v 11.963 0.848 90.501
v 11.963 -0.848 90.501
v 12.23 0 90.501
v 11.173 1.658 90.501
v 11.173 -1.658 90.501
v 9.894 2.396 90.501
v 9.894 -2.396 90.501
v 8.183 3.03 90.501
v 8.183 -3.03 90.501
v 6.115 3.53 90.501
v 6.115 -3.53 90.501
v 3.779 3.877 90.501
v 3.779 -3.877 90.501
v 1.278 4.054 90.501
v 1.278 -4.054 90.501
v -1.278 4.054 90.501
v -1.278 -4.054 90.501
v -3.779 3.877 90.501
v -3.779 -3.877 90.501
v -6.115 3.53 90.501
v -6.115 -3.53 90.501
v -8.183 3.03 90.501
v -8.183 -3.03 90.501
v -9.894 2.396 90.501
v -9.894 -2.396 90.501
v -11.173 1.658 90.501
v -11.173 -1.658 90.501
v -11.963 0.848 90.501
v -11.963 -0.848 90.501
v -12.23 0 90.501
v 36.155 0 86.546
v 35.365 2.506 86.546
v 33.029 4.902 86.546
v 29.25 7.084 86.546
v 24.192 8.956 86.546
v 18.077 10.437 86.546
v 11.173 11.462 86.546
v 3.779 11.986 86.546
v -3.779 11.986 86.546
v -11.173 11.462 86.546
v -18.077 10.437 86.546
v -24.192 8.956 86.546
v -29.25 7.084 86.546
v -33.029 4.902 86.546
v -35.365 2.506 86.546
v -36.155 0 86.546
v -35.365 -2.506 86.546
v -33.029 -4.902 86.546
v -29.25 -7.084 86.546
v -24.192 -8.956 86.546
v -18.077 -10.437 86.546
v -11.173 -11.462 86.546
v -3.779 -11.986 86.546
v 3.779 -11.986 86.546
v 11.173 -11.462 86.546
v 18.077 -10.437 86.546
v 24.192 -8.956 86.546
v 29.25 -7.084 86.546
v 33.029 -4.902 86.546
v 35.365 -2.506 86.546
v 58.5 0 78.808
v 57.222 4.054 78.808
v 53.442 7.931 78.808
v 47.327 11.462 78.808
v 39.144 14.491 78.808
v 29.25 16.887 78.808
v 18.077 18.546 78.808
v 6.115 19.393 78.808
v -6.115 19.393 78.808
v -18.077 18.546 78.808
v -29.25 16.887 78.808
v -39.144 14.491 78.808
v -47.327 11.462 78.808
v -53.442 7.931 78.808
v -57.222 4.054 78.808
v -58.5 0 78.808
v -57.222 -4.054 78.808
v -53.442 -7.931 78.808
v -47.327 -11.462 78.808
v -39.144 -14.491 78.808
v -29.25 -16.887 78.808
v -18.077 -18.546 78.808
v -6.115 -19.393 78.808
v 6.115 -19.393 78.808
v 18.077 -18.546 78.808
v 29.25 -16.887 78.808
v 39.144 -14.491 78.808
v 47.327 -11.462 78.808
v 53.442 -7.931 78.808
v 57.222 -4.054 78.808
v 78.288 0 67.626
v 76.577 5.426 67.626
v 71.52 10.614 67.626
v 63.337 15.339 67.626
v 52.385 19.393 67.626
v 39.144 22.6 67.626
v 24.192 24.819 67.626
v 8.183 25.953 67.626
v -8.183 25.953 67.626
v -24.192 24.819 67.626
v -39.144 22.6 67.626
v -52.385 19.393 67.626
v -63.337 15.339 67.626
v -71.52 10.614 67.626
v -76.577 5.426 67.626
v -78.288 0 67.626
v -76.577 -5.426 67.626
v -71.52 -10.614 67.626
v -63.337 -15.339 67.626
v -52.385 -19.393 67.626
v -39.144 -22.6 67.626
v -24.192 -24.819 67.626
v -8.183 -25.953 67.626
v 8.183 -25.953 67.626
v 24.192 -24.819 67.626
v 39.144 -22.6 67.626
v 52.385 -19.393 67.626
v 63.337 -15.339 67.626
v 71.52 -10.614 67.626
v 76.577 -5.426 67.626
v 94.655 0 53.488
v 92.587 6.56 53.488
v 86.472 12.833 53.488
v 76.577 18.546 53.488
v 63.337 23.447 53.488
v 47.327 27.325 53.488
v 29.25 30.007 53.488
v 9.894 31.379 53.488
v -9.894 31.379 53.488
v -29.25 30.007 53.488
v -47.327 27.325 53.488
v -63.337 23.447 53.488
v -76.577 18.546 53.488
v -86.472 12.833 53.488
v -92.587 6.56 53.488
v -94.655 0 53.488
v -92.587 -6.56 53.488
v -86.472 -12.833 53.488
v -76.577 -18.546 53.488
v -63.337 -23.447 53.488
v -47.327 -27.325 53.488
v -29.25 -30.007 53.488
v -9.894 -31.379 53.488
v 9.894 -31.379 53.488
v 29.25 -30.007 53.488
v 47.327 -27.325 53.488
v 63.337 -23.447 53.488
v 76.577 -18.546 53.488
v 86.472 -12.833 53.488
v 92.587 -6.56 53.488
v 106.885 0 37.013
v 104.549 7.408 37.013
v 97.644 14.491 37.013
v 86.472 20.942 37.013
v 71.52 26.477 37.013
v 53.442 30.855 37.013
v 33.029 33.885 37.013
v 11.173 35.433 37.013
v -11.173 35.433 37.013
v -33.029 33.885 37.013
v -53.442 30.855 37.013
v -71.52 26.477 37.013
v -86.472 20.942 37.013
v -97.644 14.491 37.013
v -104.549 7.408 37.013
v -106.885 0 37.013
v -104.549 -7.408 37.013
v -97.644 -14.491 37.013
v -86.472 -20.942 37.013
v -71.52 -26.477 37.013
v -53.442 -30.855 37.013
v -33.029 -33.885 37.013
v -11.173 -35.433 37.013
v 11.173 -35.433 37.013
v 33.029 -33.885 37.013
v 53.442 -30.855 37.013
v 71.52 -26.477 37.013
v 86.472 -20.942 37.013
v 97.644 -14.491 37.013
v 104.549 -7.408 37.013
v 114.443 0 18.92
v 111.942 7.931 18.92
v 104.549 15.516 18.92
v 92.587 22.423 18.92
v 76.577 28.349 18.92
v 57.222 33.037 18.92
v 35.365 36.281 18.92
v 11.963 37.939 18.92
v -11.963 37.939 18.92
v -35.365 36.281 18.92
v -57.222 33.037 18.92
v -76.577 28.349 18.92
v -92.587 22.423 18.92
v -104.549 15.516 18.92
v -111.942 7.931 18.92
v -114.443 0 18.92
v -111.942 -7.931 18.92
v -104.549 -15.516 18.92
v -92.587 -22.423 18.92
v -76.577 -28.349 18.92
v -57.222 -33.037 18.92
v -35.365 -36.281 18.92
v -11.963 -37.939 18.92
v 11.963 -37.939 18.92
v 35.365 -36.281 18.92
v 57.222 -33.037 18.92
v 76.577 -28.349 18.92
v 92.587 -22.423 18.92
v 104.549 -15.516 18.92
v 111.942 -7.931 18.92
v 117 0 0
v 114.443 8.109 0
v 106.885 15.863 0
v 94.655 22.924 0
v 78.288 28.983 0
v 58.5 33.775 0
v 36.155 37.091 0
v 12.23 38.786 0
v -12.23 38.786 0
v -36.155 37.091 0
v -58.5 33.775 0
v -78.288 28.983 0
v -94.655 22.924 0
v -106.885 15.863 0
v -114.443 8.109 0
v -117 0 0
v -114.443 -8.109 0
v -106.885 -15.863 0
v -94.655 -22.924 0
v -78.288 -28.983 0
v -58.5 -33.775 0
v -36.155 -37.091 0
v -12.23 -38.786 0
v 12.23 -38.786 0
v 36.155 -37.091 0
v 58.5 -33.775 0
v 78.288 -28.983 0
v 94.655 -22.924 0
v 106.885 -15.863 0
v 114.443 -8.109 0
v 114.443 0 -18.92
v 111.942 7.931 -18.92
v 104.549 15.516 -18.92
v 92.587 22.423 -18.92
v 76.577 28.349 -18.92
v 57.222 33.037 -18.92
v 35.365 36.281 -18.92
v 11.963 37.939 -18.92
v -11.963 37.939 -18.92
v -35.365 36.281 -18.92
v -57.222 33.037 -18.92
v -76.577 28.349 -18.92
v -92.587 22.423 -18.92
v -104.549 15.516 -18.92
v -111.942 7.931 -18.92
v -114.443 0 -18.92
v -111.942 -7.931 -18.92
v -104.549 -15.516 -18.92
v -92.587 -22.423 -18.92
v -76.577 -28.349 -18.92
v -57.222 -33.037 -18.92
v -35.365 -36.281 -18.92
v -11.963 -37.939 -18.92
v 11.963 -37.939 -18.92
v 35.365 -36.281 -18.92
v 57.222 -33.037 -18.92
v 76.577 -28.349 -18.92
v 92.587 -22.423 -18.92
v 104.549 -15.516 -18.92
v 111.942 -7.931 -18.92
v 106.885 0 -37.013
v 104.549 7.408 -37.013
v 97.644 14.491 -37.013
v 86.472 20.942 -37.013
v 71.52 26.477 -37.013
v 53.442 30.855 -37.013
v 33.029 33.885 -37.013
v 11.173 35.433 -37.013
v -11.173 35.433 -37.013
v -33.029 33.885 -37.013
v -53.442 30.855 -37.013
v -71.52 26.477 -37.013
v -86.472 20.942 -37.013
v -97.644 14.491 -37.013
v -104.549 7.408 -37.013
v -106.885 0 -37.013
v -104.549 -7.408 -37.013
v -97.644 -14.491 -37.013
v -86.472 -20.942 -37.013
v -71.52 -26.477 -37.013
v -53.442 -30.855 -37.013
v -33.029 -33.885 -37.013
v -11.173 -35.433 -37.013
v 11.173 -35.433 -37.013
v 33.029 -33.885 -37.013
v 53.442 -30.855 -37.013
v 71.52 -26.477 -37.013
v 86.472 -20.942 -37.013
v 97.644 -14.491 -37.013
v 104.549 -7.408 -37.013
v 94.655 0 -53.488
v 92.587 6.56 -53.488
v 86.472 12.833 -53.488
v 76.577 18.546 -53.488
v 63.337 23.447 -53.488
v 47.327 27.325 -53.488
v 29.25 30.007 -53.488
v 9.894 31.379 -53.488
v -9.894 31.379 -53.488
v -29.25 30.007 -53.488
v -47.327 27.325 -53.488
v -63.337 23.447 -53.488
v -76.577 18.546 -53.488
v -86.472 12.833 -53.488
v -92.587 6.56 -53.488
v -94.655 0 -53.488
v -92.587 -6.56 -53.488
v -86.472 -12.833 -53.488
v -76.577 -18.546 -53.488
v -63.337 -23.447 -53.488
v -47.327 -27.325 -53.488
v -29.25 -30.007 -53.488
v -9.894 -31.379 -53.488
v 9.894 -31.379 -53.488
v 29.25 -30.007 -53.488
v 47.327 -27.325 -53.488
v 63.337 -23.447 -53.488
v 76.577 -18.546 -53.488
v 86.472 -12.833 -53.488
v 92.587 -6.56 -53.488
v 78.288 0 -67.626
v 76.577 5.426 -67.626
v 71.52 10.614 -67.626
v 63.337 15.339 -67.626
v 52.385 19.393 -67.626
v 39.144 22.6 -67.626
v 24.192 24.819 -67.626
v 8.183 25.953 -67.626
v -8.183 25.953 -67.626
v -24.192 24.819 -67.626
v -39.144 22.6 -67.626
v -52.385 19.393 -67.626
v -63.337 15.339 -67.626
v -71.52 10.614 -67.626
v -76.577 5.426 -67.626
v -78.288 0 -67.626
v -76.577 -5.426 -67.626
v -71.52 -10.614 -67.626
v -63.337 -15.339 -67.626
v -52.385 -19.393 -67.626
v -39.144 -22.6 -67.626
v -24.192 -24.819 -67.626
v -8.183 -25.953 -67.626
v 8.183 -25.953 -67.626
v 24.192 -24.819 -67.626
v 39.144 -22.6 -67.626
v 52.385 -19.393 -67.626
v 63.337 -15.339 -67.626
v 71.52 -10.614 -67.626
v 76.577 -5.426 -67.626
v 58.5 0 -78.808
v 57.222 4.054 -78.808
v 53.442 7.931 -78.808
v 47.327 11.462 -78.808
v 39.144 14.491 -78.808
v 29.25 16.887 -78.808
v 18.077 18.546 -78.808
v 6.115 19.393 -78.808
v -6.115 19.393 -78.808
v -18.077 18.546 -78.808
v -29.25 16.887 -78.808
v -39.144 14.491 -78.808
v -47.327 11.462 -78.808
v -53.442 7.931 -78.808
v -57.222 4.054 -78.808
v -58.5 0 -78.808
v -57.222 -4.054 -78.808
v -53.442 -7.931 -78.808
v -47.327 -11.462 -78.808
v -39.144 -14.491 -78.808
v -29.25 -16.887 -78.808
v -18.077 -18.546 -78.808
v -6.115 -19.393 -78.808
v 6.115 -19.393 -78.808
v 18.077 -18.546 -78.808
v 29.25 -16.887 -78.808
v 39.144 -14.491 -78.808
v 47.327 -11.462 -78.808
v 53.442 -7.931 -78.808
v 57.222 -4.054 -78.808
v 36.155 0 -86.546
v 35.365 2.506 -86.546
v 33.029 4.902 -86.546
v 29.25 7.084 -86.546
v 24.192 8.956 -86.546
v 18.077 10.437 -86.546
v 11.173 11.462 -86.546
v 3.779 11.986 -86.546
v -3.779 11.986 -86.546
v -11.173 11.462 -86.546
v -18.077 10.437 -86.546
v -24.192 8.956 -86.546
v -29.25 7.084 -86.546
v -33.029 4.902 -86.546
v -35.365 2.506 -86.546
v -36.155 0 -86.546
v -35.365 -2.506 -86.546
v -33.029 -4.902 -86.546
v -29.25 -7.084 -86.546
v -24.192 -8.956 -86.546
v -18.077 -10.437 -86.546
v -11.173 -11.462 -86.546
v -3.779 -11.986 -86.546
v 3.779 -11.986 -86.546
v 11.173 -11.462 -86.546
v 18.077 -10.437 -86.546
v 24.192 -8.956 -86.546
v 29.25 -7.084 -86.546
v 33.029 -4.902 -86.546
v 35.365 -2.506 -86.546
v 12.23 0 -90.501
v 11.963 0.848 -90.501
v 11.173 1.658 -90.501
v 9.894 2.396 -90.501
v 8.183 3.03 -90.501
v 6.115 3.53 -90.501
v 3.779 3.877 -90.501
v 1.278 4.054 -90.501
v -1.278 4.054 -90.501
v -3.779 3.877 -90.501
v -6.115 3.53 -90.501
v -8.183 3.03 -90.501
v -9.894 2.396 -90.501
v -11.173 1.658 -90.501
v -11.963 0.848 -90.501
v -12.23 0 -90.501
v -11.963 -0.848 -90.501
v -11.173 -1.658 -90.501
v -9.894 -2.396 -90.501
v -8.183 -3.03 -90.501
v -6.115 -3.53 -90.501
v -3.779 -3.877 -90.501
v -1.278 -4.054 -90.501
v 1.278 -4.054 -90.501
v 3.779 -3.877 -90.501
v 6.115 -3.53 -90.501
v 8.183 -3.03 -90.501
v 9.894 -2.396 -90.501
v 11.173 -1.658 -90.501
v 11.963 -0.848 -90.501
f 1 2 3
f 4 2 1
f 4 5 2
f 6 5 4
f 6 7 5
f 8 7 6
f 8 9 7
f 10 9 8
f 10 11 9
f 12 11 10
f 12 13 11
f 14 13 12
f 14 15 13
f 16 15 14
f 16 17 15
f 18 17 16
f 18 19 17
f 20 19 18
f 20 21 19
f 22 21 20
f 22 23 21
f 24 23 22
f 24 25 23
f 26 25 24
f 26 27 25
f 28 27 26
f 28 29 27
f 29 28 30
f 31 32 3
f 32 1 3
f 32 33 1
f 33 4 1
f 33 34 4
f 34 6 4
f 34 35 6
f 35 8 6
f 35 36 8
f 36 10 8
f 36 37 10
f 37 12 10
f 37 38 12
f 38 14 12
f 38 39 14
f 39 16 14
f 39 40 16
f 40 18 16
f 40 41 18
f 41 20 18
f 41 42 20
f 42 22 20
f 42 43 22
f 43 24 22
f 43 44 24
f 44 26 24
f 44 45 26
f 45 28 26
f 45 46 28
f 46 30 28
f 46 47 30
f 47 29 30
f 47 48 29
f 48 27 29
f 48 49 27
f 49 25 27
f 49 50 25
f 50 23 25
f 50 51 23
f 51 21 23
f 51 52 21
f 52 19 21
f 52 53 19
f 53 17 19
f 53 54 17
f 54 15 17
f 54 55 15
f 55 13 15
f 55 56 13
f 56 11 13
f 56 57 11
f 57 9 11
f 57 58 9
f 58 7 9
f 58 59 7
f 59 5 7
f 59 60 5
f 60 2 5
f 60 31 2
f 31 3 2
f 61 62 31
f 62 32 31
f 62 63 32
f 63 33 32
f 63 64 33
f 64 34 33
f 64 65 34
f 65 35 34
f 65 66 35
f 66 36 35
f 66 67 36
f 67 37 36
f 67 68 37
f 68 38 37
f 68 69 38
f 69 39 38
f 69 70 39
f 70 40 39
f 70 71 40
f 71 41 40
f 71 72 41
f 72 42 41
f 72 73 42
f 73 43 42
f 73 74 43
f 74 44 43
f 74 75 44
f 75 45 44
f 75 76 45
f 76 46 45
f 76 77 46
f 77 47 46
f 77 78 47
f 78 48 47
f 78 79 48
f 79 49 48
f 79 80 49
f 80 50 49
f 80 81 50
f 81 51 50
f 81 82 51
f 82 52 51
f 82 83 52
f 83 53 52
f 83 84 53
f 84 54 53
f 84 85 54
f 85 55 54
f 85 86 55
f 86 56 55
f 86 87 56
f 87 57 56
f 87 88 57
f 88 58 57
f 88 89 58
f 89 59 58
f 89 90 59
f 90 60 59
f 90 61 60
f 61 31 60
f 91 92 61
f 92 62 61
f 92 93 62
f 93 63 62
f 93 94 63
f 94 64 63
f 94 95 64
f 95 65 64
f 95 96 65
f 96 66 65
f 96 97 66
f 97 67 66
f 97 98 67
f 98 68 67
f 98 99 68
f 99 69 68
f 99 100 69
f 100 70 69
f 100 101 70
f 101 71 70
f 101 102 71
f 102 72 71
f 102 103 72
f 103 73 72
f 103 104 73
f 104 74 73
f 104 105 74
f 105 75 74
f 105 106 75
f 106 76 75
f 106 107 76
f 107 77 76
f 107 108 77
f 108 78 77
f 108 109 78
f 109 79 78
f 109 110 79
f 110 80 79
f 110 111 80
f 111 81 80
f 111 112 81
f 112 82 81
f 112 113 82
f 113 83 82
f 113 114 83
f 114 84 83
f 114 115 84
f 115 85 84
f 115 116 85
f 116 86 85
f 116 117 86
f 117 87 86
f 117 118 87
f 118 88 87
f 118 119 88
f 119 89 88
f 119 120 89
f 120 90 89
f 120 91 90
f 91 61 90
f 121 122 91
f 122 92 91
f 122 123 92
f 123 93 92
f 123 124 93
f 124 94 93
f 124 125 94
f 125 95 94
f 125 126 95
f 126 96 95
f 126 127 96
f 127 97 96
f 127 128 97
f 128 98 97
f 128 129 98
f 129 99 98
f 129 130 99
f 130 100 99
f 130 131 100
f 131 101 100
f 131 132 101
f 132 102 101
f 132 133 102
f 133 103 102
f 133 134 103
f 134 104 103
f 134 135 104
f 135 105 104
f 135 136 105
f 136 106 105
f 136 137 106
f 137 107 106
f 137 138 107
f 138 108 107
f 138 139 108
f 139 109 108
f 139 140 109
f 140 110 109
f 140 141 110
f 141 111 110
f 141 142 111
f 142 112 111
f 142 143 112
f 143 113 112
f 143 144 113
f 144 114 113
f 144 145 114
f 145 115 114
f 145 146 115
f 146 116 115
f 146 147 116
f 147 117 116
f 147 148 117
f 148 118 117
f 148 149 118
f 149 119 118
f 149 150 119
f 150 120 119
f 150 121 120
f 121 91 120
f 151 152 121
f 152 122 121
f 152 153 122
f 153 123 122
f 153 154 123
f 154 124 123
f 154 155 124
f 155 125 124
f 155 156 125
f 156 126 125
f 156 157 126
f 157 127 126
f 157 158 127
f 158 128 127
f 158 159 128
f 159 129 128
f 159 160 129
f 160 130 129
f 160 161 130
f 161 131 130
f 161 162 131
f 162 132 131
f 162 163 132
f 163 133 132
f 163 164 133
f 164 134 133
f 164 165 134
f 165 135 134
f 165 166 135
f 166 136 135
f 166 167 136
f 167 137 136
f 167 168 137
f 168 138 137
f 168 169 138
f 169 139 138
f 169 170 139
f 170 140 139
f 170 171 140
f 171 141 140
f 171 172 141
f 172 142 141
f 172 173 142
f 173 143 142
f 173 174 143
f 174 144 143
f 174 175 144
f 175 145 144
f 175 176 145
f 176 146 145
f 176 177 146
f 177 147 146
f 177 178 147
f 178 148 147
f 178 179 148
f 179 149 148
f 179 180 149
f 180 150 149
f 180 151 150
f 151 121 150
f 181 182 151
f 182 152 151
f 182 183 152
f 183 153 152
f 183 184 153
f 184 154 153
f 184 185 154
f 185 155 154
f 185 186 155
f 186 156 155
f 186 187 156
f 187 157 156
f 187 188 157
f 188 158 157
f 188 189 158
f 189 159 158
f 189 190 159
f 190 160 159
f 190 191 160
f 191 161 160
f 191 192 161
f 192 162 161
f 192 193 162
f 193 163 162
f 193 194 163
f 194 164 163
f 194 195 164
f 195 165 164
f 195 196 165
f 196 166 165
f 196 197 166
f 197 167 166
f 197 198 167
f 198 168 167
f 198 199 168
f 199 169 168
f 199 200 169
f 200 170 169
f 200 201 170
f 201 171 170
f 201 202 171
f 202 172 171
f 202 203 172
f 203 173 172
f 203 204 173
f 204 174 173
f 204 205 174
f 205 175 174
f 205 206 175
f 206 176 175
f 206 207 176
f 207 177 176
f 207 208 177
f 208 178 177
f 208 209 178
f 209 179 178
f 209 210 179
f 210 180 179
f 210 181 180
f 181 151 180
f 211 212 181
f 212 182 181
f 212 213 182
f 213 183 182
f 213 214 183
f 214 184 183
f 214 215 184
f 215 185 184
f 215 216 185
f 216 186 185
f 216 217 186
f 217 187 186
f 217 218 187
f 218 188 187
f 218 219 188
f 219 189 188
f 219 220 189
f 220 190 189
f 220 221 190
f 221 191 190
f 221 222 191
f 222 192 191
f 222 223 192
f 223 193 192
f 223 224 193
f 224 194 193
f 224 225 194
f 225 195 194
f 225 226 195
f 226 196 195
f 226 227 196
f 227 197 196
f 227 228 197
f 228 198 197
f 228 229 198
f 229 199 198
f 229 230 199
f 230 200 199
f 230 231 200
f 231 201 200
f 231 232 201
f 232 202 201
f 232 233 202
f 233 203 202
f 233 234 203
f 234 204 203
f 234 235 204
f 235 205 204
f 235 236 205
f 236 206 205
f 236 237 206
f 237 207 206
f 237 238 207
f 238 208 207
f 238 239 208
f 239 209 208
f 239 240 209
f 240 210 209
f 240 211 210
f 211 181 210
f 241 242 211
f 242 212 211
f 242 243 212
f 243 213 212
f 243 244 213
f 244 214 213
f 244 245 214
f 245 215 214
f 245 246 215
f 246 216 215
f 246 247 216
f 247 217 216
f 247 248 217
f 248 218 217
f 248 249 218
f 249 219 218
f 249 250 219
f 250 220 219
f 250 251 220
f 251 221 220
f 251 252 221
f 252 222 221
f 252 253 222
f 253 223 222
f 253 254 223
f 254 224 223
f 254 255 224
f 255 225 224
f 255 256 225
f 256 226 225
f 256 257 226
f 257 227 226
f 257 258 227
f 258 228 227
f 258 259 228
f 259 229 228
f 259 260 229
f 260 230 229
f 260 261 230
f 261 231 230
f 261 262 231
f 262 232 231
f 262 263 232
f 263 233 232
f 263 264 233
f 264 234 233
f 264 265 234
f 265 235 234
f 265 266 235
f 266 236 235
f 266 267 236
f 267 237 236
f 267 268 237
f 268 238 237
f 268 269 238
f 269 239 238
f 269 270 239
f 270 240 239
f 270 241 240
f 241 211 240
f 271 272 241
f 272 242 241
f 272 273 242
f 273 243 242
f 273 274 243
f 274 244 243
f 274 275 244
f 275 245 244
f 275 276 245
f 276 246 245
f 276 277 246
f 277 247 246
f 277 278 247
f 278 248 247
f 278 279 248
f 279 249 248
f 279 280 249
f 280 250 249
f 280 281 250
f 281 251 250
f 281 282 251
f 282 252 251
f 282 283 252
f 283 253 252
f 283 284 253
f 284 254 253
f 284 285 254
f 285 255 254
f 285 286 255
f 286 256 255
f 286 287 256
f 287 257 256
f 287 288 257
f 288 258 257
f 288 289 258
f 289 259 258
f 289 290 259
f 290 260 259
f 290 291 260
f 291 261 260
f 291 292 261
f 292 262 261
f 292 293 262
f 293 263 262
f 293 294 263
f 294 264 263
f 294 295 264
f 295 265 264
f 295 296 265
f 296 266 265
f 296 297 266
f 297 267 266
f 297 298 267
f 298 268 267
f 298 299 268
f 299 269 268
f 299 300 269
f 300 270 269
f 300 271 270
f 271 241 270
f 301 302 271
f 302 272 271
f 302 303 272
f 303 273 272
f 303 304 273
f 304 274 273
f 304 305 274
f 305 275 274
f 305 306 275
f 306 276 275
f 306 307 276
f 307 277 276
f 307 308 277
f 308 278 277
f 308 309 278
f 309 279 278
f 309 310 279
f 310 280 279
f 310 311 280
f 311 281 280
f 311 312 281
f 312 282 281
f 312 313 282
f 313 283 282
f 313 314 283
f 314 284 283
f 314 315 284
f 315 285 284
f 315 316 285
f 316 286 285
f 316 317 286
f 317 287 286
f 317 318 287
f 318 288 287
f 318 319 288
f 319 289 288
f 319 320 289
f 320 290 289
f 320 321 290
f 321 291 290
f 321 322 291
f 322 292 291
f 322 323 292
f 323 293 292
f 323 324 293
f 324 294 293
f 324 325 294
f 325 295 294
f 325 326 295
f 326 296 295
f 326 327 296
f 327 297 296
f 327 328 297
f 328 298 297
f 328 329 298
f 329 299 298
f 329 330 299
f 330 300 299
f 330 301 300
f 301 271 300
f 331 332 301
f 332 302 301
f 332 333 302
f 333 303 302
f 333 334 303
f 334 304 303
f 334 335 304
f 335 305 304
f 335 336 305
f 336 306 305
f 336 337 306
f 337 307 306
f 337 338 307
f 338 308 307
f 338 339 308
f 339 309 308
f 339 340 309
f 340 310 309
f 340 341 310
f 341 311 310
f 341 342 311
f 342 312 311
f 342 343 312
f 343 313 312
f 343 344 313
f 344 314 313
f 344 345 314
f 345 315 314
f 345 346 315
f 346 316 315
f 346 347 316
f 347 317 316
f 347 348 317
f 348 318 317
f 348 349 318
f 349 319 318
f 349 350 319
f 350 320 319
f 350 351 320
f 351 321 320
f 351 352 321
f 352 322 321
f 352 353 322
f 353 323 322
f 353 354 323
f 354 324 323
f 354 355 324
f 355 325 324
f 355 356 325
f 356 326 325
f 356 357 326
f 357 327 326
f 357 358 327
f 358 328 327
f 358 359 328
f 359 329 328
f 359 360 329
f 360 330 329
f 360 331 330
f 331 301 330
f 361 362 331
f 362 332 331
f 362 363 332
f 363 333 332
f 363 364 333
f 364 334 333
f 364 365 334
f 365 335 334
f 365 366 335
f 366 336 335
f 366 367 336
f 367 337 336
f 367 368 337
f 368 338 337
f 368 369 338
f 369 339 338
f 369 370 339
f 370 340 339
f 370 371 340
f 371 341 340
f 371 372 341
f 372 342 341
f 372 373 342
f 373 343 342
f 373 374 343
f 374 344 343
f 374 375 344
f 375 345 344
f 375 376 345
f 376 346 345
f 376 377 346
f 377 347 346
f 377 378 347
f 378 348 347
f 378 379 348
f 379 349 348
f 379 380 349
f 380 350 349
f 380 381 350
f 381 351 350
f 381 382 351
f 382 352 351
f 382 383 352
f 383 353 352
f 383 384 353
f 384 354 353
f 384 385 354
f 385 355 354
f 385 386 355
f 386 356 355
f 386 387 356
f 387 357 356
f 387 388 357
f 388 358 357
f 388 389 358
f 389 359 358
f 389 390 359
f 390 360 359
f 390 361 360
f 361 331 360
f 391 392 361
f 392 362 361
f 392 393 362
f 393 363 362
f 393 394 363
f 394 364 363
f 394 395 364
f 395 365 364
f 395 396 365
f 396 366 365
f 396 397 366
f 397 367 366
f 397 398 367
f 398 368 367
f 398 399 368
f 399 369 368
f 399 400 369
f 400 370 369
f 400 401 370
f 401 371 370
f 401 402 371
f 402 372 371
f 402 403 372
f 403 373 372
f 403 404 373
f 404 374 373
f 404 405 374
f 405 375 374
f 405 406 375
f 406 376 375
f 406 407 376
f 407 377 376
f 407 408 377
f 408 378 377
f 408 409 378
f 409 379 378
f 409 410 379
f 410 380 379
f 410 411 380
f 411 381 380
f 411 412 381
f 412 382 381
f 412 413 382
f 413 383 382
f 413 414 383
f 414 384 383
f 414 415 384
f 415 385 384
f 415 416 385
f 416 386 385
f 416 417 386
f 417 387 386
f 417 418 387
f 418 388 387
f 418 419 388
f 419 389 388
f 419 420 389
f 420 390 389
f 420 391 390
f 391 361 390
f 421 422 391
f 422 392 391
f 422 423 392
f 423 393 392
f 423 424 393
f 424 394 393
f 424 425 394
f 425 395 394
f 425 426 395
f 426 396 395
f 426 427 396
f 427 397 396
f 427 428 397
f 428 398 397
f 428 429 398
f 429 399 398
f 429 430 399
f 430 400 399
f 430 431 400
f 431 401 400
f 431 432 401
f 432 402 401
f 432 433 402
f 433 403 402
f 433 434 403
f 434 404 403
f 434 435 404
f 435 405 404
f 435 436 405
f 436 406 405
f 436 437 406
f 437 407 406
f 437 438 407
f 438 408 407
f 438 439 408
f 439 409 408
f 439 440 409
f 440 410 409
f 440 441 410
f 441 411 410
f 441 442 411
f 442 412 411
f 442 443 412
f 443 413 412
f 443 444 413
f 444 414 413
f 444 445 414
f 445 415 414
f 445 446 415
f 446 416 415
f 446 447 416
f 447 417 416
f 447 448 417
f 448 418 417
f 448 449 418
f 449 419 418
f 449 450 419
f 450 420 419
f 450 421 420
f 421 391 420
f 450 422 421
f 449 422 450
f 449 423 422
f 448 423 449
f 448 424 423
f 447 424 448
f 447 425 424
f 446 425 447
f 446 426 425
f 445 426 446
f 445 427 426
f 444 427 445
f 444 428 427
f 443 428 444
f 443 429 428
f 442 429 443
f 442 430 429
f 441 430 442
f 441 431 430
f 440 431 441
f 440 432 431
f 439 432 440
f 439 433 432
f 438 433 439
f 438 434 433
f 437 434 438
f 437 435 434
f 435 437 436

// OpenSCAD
// Generated by SolidPython 1.0.1 on 2020-07-29 00:46:48


scale(v = [9, 3, 7]) {
	sphere(r = 13);
}
/***********************************************
*********      SolidPython code:      **********
************************************************
 
# import packages: SolidPython
from solid import *
from solid.utils import *
from itertools import chain, combinations, permutations


class Resize:

    def __init__(self, scad_file):
        self.scad_file = scad_file
        #self.scad_file = import_scad(scad_file)
        # cone/cylinder param:
        self.r1 = 0
        self.r2 = 0
        self.h = 0
        # rectangular prism param:
        self.w = 0
        self.l = 0
        # ellipse param:
        self.r = 0

    # import OpenScad code (file name corresponds to shape)


    # classify shape + parameters
    def assign(self, param1, param2, param3):
        if self.scad_file == 'cone.scad':
            self.r1 = param1
            self.r2 = param2
            self.h = param3
        elif self.scad_file == 'cylinder.scad':
            self.r1 = param1
            self.r2 = param2
            self.h = param3
        elif self.scad_file == 'rectangularPrism.scad':
            self.h = param1
            self.l = param2
            self.w = param3
        else:
            self.r = param1
            self.h = param2

    # resize parameters
    def iterate(self):
        x = range(3, 20, 2)
        i = 1
        if self.scad_file == 'cone.scad':
            tempList = list(permutations(x, 2))
            for temp in tempList:
                param1 = temp[0]
                param2 = temp[1]
                filepath = 'produced_scad_files/' + 'cone' + str(param1) + '_' + str(param2) + '_' + '.scad'
                scad_render_to_file(cylinder(h=param1, r1=param2, r2=0), filepath)

        elif self.scad_file == 'cylinder.scad':
            tempList = list(permutations(x, 3))
            for temp in tempList:
                param1 = temp[0]
                param2 = temp[1]
                filepath = 'produced_scad_files/' + 'cylinder' + str(param1) + '_' + str(param2) + '_' + '.scad'
                scad_render_to_file(cylinder(h=param1, r1=param2, r2=param2), filepath)

        elif self.scad_file == 'rectangularPrism.scad':
            tempList = list(permutations(x, 3))
            for temp in tempList:
                param1 = temp[0]
                param2 = temp[1]
                param3 = temp[2]
                filepath = 'produced_scad_files/' + 'rectangularPrism' + str(param1) + '_' + str(param2) + '_' + str(
                    param3) + '.scad'
                scad_render_to_file(cube(size=(param1, param2, param3)), filepath)

        elif self.scad_file == 'ellipse.scad':
            tempList = list(permutations(x, 4))
            for temp in tempList:
                param1 = temp[0]
                param2 = temp[1]
                param3 = temp[2]
                param4 = temp[3]
                filepath = 'produced_scad_files/' + 'ellipse' + str(param1) + '_' + str(param2) + '_' + str(param3) + '_' + str(param4) + '.scad'
                scad_render_to_file(scale([param1, param2, param3])(sphere(r=param4)), filepath)

    def render_to_scadfile(self):
        scad_render_to_file(scad, 'example.scad') 
 
************************************************/
